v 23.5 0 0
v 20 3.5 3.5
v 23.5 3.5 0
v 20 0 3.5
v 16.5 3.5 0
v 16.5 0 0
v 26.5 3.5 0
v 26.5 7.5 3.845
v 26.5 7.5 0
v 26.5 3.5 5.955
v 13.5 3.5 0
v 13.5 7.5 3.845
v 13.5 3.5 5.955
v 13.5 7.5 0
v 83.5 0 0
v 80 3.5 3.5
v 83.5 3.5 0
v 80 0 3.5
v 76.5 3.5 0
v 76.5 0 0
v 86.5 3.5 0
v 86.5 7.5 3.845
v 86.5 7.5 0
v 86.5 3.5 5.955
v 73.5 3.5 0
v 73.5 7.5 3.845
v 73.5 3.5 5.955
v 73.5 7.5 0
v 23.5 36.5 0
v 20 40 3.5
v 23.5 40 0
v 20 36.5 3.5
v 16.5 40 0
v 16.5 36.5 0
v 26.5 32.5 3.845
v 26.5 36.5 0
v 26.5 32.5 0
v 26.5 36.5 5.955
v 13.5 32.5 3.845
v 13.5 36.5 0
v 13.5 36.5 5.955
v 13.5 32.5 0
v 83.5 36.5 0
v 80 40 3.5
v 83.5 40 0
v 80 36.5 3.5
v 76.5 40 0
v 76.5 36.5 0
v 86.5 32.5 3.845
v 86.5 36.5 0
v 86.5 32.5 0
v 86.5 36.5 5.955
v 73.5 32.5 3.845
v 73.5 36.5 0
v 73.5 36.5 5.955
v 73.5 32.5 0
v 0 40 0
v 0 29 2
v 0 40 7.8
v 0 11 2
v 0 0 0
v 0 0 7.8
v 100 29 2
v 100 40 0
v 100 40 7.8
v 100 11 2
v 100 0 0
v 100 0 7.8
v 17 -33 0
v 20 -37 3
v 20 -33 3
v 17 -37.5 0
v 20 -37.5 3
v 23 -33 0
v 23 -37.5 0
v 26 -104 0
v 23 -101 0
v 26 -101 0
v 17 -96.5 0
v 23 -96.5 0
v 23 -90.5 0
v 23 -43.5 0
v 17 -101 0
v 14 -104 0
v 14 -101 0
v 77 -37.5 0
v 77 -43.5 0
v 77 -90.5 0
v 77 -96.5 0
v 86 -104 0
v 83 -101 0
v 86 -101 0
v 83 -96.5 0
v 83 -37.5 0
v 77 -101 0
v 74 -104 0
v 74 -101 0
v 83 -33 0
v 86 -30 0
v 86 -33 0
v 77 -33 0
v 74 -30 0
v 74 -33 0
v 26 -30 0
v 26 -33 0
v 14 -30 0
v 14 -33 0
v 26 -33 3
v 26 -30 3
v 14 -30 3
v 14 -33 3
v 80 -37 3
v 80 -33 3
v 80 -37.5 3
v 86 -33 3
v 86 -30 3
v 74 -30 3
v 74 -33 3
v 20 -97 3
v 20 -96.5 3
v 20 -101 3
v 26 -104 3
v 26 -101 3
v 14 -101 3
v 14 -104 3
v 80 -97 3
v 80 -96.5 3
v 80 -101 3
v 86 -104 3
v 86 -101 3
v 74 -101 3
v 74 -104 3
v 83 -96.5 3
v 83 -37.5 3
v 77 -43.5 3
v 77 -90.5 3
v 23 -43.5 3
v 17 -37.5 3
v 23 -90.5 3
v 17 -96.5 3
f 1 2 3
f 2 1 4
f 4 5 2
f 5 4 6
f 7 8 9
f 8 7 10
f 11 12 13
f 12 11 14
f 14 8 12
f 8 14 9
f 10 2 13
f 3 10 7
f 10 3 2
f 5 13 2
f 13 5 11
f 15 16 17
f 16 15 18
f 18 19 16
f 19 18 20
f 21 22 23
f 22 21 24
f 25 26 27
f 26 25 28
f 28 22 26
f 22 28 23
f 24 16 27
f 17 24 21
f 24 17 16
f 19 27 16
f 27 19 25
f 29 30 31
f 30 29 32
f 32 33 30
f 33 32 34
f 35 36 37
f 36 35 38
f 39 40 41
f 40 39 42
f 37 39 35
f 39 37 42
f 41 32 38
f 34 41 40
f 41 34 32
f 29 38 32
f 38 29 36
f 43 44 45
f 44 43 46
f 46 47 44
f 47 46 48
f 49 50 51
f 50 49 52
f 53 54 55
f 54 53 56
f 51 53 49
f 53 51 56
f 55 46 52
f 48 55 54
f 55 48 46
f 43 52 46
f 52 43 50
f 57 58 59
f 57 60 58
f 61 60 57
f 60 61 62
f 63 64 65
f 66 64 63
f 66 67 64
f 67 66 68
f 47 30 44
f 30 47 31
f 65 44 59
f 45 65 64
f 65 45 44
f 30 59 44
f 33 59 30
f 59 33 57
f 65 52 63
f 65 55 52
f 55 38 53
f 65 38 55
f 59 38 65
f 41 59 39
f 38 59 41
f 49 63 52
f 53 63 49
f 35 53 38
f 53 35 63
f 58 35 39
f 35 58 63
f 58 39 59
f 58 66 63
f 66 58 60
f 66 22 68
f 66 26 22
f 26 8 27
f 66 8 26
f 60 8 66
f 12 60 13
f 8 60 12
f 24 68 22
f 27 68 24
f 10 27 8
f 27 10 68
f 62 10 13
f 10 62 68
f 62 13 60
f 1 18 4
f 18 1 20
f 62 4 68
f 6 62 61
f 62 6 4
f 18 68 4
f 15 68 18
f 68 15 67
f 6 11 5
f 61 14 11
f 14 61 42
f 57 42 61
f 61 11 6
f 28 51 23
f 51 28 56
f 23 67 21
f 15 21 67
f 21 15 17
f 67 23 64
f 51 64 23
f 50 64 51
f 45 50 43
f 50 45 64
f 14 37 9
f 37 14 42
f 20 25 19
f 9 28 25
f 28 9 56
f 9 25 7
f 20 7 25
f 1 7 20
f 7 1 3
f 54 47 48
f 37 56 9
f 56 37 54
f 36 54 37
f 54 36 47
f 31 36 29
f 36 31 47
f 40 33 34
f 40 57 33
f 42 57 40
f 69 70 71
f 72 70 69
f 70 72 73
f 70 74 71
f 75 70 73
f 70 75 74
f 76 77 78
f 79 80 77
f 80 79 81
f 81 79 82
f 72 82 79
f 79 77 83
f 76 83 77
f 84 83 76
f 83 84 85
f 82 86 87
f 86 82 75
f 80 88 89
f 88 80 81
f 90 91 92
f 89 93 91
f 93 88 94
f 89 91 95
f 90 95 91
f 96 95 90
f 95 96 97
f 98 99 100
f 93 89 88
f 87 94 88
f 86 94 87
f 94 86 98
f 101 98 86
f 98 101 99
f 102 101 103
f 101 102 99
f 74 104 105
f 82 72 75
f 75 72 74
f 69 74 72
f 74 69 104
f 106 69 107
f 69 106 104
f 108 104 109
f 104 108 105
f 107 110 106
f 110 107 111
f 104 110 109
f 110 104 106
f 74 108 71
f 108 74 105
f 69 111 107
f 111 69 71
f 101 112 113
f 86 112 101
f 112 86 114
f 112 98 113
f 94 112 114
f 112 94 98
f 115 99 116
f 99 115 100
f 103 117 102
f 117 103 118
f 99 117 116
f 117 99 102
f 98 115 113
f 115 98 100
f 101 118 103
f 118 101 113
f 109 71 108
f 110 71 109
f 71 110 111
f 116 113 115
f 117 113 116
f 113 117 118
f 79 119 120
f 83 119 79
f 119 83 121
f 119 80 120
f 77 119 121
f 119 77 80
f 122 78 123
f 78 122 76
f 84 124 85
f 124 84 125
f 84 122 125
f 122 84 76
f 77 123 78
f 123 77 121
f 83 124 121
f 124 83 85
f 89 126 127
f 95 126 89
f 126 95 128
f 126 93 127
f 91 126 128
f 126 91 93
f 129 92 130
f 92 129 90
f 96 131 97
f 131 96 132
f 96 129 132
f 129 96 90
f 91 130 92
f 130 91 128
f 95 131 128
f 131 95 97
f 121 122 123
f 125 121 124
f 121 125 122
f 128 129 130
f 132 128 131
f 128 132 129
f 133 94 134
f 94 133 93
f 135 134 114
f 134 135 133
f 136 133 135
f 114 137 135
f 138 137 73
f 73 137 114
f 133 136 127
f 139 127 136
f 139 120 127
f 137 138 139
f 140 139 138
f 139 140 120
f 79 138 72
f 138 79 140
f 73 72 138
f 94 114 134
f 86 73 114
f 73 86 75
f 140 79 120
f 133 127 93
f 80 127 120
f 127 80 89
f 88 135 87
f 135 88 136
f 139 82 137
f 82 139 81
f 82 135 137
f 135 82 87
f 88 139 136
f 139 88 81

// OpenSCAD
// Remember to render (F6) before exporting!!

// This file contains definition for both cradle and connector,
// as there are dependencies between definitions of both parts.

// Parameters, in Makerbot's Customizer format:

// (mm)
bottle_spacing = 100;

// The gap/tolerance between connector pegs and the cradle (mm)
connector_cradle_tolerance = 0.5;

// The space between connector and cradle when rendering for multi-part printing (mm)
connector_cradle_spacing = 30;

/* [Hidden] */
$fs=.1;
$fa=1;

base_height = 2; // z thickness of the base plate
cradle_length = 100; // x length of the base plate and wedges
wedge_height = 5.8; // z height of each wedge above the top of the base plate
wedge_width = 11;
wedge_separation = 18; // y distance between the inner wedge tips
connector_peg_width = 12; // x size, needs to be less than cradle_length
connector_peg_depth = 3; // y size, needs to be less than wedge_width
connector_peg_xs = [20, cradle_length-20]; // x locations of the connector pegs' centres
connector_bridge_height = 3; // z height, needs to be less than the connector peg's max height

// Cache some oft-used calculations
cradle_height = base_height + wedge_height;
cradle_width = (2*wedge_width) + wedge_separation; // along y axis
peg_inner_y = (wedge_width-connector_peg_depth)/2 +connector_peg_depth; // y coord of peg's inner face

module non_connectable_cradle() {
	// Create the cradle as a linear extrusion of a profile polygon.
	// It is 2 opposing wedges, with a flat platform to join them.
	// This does not include slots for joining cradles together.
	total_width = (2*wedge_width) + wedge_separation;
	rotate([0,90,0])
	linear_extrude(height=cradle_length, center=false, convexity=10, twist=0)
	polygon(points=[[0,0],[0,total_width],[-cradle_height,total_width],[-base_height,total_width-wedge_width],[-base_height,wedge_width],[-cradle_height,0]], convexity=4);
}

module slot_pegs_side1(offset) {
	peg_y = (wedge_width-connector_peg_depth)/2 - offset;
	rod_len = peg_y + connector_cradle_tolerance + 0.2; // add .2 so rod protrudes into peg and connector
	rod_height = connector_bridge_height + offset;
	
	for(x=connector_peg_xs)
	union() {
		// Rod that will join the connector to the slot peg.
		// It's triangular (vs square or spherical) so that the overhang
		// on the cradle part is printable via FDM.
		translate([0, -connector_cradle_tolerance-0.1, 0])
		rotate([-90, 0, 0])
		linear_extrude(height=rod_len, center=false, convexity=10, twist=0)
		polygon(points=[[x-rod_height,0], [x,-rod_height], [x+rod_height,0], [x+rod_height,offset], [x-rod_height,offset]], convexity=1);
		
		// Intersect with cradle to prevent the peg from protruding higher than the wedge surface.
		slot_x = x - (connector_peg_width/2) - offset;
		translate([slot_x, peg_y, -offset]) 
		cube([connector_peg_width + 2*offset, connector_peg_depth + 2*offset, cradle_height + 2*offset]);
	}
}

module slot_pegs_side2(offset) {
	y_trans =
		peg_inner_y + offset // move to x axis after mirror operation
		+ cradle_width - (peg_inner_y + offset);
	translate([0,y_trans,0])
	mirror([0,1,0]) // mirror about x/z axis (y=0)
	slot_pegs_side1(offset);
}

module connector() {
	jbh = connector_bridge_height; // abbreviate
	cradle_separation = bottle_spacing - cradle_width;
	bridge_length = cradle_separation - (2*connector_cradle_tolerance); // y size
	bridge_width = max(connector_peg_xs) - min(connector_peg_xs) + (2*jbh); // x size
	bridge_x = min(connector_peg_xs) - jbh;
	
	// Trim pegs down to the same height as the bridge,
	// because FDM printing can't neatly print the 4 protrusions.
	difference() {
		slot_pegs_side1(0);
		translate([0,0,jbh]) cube([cradle_length, cradle_width, cradle_height]);
	}
	
	translate([0, -bottle_spacing, 0]) 
	difference() {
		slot_pegs_side2(0);
		translate([0,0,jbh]) cube([cradle_length, cradle_width, cradle_height]);
	}
	
	translate([bridge_x, -bridge_length-connector_cradle_tolerance, 0]) 
	// Remove inner, creating 4 walls to the connector, to save material.
	difference() {
		cube([bridge_width, bridge_length, jbh]);
		
		translate([2*jbh, 2*jbh, -1])
		cube([bridge_width - 4*jbh, bridge_length - 4*jbh, jbh+2]);
	}
}

module connectable_cradle() {
	difference(){
		non_connectable_cradle();
		
		// Expand the connector shape to allow the printed shapes to fit
		// in the event of sloppy printing.
		slot_pegs_side1(connector_cradle_tolerance);
		slot_pegs_side2(connector_cradle_tolerance);
	}
}



// Render cradle and connector with sufficient spacing that permits sequential printing.
connectable_cradle();

translate([0, -peg_inner_y-connector_cradle_spacing, 0])
connector();
